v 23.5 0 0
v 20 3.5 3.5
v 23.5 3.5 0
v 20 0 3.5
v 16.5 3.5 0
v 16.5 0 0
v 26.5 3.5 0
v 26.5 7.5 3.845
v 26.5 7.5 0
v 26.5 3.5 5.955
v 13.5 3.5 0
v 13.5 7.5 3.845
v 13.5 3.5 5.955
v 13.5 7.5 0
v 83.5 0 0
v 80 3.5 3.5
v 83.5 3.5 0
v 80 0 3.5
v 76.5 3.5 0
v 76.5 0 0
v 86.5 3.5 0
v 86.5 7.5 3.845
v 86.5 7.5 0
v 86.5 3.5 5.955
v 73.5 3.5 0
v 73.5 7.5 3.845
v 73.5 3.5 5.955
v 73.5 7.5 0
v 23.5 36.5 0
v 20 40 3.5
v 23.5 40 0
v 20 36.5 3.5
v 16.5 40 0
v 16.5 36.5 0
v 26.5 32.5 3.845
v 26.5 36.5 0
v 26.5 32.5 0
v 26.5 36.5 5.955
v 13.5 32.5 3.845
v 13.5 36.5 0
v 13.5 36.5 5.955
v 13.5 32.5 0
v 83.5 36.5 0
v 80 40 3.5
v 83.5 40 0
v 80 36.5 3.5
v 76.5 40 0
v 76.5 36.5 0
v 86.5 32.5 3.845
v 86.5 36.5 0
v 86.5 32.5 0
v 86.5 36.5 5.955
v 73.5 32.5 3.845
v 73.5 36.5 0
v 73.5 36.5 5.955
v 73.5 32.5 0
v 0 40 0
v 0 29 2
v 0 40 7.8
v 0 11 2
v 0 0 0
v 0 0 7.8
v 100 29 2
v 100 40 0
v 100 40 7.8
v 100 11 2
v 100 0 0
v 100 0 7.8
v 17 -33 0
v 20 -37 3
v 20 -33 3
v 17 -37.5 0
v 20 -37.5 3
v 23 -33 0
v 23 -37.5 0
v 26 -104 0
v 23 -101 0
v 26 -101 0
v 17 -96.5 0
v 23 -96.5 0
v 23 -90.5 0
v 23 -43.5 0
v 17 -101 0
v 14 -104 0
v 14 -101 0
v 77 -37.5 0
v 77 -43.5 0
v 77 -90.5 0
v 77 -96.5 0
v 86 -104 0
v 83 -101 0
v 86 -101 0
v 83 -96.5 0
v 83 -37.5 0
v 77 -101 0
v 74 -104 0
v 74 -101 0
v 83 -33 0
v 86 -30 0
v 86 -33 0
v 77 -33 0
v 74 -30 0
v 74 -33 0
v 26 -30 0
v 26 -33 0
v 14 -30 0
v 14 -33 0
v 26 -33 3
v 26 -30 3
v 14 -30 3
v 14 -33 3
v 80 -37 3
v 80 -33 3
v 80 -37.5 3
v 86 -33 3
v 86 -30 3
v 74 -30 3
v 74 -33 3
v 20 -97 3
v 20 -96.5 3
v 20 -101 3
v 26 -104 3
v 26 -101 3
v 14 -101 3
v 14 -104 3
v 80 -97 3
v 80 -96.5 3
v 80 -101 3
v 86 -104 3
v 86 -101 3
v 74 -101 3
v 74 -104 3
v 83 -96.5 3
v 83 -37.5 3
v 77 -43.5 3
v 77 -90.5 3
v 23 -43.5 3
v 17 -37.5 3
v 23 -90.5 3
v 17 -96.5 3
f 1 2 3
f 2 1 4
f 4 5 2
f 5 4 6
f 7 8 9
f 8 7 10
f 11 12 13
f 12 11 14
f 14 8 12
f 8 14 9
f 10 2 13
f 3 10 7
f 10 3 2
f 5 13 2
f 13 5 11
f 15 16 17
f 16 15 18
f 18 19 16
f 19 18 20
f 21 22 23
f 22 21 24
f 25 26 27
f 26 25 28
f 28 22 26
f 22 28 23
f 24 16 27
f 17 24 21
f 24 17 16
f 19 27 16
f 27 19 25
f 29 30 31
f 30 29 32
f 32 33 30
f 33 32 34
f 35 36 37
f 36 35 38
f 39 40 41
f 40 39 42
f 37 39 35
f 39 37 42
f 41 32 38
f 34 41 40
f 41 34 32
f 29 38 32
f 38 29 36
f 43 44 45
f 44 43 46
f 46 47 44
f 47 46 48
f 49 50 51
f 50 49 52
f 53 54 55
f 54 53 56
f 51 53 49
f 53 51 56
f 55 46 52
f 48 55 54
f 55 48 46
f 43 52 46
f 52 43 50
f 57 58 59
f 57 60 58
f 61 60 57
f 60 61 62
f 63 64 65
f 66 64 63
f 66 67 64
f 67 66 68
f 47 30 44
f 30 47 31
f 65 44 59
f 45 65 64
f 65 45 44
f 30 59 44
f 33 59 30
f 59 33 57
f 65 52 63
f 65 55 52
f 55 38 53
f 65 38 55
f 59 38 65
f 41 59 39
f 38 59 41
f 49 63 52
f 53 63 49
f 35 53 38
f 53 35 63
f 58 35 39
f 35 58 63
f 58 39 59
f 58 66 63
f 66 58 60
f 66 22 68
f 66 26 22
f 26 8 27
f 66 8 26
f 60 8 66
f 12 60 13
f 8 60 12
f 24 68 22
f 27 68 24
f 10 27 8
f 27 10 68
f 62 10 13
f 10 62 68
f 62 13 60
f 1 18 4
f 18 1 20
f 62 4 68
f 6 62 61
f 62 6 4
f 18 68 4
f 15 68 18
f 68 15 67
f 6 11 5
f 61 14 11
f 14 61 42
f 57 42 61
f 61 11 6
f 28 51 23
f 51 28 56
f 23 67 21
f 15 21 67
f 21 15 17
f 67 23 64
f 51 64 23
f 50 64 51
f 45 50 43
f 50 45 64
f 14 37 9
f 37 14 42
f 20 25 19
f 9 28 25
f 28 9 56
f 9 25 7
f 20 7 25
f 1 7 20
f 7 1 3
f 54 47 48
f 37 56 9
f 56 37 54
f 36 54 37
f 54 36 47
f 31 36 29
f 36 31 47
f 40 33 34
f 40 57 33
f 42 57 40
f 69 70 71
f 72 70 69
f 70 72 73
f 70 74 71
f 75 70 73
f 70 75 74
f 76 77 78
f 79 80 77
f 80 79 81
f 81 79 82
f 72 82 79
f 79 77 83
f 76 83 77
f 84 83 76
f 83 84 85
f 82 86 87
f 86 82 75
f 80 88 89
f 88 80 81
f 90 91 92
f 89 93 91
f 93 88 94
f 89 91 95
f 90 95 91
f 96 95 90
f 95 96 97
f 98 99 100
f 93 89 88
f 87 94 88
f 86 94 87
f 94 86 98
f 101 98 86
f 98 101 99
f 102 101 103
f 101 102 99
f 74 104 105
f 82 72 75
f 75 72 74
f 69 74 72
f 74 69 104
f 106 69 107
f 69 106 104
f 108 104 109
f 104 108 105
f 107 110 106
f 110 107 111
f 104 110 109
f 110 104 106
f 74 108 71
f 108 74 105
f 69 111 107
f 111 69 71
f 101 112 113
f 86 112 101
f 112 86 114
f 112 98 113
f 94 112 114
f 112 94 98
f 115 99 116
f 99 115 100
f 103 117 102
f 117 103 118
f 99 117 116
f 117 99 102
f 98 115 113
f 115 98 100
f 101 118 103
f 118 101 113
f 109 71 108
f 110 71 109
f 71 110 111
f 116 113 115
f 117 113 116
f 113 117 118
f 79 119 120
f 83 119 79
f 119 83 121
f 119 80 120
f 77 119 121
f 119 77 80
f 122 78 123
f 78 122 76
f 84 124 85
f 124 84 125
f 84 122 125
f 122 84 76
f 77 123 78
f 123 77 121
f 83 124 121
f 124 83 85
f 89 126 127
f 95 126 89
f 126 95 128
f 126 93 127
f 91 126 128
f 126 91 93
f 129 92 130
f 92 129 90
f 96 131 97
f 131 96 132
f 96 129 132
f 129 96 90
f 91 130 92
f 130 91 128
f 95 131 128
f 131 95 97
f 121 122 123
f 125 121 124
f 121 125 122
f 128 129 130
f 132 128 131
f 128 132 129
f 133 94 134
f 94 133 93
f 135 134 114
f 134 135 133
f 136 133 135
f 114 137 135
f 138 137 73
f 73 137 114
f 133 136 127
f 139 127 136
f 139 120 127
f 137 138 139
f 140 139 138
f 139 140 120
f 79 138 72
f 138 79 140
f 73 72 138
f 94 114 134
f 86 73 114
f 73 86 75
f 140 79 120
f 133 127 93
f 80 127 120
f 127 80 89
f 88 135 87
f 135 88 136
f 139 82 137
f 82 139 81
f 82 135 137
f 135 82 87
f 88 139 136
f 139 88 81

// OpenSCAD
// Remember to render (F6) before exporting!!

// This file contains definition for both cradle and connector,
// as there are dependencies between definitions of both parts.

// Parameters, in Makerbot's Customizer format:

// (mm)
bottle_spacing = 100;

// The gap/tolerance between connector pegs and the cradle (mm)
connector_cradle_tolerance = 0.5;

// The space between connector and cradle when rendering for multi-part printing (mm)
connector_cradle_spacing = 30;

/* [Hidden] */
$fs=.1;
$fa=1;

base_height = 2; // z thickness of the base plate
cradle_length = 100; // x length of the base plate and wedges
wedge_height = 5.8; // z height of each wedge above the top of the base plate
wedge_width = 11;
wedge_separation = 18; // y distance between the inner wedge tips
connector_peg_width = 12; // x size, needs to be less than cradle_length
connector_peg_depth = 3; // y size, needs to be less than wedge_width
connector_peg_xs = [20, cradle_length-20]; // x locations of the connector pegs' centres
connector_bridge_height = 3; // z height, needs to be less than the connector peg's max height

// Cache some oft-used calculations
cradle_height = base_height + wedge_height;
cradle_width = (2*wedge_width) + wedge_separation; // along y axis
peg_inner_y = (wedge_width-connector_peg_depth)/2 +connector_peg_depth; // y coord of peg's inner face

module non_connectable_cradle() {
	// Create the cradle as a linear extrusion of a profile polygon.
	// It is 2 opposing wedges, with a flat platform to join them.
	// This does not include slots for joining cradles together.
	total_width = (2*wedge_width) + wedge_separation;
	rotate([0,90,0])
	linear_extrude(height=cradle_length, center=false, convexity=10, twist=0)
	polygon(points=[[0,0],[0,total_width],[-cradle_height,total_width],[-base_height,total_width-wedge_width],[-base_height,wedge_width],[-cradle_height,0]], convexity=4);
}

module slot_pegs_side1(offset) {
	peg_y = (wedge_width-connector_peg_depth)/2 - offset;
	rod_len = peg_y + connector_cradle_tolerance + 0.2; // add .2 so rod protrudes into peg and connector
	rod_height = connector_bridge_height + offset;
	
	for(x=connector_peg_xs)
	union() {
		// Rod that will join the connector to the slot peg.
		// It's triangular (vs square or spherical) so that the overhang
		// on the cradle part is printable via FDM.
		translate([0, -connector_cradle_tolerance-0.1, 0])
		rotate([-90, 0, 0])
		linear_extrude(height=rod_len, center=false, convexity=10, twist=0)
		polygon(points=[[x-rod_height,0], [x,-rod_height], [x+rod_height,0], [x+rod_height,offset], [x-rod_height,offset]], convexity=1);
		
		// Intersect with cradle to prevent the peg from protruding higher than the wedge surface.
		slot_x = x - (connector_peg_width/2) - offset;
		translate([slot_x, peg_y, -offset]) 
		cube([connector_peg_width + 2*offset, connector_peg_depth + 2*offset, cradle_height + 2*offset]);
	}
}

module slot_pegs_side2(offset) {
	y_trans =
		peg_inner_y + offset // move to x axis after mirror operation
		+ cradle_width - (peg_inner_y + offset);
	translate([0,y_trans,0])
	mirror([0,1,0]) // mirror about x/z axis (y=0)
	slot_pegs_side1(offset);
}

module connector() {
	jbh = connector_bridge_height; // abbreviate
	cradle_separation = bottle_spacing - cradle_width;
	bridge_length = cradle_separation - (2*connector_cradle_tolerance); // y size
	bridge_width = max(connector_peg_xs) - min(connector_peg_xs) + (2*jbh); // x size
	bridge_x = min(connector_peg_xs) - jbh;
	
	// Trim pegs down to the same height as the bridge,
	// because FDM printing can't neatly print the 4 protrusions.
	difference() {
		slot_pegs_side1(0);
		translate([0,0,jbh]) cube([cradle_length, cradle_width, cradle_height]);
	}
	
	translate([0, -bottle_spacing, 0]) 
	difference() {
		slot_pegs_side2(0);
		translate([0,0,jbh]) cube([cradle_length, cradle_width, cradle_height]);
	}
	
	translate([bridge_x, -bridge_length-connector_cradle_tolerance, 0]) 
	// Remove inner, creating 4 walls to the connector, to save material.
	difference() {
		cube([bridge_width, bridge_length, jbh]);
		
		translate([2*jbh, 2*jbh, -1])
		cube([bridge_width - 4*jbh, bridge_length - 4*jbh, jbh+2]);
	}
}

module connectable_cradle() {
	difference(){
		non_connectable_cradle();
		
		// Expand the connector shape to allow the printed shapes to fit
		// in the event of sloppy printing.
		slot_pegs_side1(connector_cradle_tolerance);
		slot_pegs_side2(connector_cradle_tolerance);
	}
}



// Render cradle and connector with sufficient spacing that permits sequential printing.
connectable_cradle();

translate([0, -peg_inner_y-connector_cradle_spacing, 0])
connector();
